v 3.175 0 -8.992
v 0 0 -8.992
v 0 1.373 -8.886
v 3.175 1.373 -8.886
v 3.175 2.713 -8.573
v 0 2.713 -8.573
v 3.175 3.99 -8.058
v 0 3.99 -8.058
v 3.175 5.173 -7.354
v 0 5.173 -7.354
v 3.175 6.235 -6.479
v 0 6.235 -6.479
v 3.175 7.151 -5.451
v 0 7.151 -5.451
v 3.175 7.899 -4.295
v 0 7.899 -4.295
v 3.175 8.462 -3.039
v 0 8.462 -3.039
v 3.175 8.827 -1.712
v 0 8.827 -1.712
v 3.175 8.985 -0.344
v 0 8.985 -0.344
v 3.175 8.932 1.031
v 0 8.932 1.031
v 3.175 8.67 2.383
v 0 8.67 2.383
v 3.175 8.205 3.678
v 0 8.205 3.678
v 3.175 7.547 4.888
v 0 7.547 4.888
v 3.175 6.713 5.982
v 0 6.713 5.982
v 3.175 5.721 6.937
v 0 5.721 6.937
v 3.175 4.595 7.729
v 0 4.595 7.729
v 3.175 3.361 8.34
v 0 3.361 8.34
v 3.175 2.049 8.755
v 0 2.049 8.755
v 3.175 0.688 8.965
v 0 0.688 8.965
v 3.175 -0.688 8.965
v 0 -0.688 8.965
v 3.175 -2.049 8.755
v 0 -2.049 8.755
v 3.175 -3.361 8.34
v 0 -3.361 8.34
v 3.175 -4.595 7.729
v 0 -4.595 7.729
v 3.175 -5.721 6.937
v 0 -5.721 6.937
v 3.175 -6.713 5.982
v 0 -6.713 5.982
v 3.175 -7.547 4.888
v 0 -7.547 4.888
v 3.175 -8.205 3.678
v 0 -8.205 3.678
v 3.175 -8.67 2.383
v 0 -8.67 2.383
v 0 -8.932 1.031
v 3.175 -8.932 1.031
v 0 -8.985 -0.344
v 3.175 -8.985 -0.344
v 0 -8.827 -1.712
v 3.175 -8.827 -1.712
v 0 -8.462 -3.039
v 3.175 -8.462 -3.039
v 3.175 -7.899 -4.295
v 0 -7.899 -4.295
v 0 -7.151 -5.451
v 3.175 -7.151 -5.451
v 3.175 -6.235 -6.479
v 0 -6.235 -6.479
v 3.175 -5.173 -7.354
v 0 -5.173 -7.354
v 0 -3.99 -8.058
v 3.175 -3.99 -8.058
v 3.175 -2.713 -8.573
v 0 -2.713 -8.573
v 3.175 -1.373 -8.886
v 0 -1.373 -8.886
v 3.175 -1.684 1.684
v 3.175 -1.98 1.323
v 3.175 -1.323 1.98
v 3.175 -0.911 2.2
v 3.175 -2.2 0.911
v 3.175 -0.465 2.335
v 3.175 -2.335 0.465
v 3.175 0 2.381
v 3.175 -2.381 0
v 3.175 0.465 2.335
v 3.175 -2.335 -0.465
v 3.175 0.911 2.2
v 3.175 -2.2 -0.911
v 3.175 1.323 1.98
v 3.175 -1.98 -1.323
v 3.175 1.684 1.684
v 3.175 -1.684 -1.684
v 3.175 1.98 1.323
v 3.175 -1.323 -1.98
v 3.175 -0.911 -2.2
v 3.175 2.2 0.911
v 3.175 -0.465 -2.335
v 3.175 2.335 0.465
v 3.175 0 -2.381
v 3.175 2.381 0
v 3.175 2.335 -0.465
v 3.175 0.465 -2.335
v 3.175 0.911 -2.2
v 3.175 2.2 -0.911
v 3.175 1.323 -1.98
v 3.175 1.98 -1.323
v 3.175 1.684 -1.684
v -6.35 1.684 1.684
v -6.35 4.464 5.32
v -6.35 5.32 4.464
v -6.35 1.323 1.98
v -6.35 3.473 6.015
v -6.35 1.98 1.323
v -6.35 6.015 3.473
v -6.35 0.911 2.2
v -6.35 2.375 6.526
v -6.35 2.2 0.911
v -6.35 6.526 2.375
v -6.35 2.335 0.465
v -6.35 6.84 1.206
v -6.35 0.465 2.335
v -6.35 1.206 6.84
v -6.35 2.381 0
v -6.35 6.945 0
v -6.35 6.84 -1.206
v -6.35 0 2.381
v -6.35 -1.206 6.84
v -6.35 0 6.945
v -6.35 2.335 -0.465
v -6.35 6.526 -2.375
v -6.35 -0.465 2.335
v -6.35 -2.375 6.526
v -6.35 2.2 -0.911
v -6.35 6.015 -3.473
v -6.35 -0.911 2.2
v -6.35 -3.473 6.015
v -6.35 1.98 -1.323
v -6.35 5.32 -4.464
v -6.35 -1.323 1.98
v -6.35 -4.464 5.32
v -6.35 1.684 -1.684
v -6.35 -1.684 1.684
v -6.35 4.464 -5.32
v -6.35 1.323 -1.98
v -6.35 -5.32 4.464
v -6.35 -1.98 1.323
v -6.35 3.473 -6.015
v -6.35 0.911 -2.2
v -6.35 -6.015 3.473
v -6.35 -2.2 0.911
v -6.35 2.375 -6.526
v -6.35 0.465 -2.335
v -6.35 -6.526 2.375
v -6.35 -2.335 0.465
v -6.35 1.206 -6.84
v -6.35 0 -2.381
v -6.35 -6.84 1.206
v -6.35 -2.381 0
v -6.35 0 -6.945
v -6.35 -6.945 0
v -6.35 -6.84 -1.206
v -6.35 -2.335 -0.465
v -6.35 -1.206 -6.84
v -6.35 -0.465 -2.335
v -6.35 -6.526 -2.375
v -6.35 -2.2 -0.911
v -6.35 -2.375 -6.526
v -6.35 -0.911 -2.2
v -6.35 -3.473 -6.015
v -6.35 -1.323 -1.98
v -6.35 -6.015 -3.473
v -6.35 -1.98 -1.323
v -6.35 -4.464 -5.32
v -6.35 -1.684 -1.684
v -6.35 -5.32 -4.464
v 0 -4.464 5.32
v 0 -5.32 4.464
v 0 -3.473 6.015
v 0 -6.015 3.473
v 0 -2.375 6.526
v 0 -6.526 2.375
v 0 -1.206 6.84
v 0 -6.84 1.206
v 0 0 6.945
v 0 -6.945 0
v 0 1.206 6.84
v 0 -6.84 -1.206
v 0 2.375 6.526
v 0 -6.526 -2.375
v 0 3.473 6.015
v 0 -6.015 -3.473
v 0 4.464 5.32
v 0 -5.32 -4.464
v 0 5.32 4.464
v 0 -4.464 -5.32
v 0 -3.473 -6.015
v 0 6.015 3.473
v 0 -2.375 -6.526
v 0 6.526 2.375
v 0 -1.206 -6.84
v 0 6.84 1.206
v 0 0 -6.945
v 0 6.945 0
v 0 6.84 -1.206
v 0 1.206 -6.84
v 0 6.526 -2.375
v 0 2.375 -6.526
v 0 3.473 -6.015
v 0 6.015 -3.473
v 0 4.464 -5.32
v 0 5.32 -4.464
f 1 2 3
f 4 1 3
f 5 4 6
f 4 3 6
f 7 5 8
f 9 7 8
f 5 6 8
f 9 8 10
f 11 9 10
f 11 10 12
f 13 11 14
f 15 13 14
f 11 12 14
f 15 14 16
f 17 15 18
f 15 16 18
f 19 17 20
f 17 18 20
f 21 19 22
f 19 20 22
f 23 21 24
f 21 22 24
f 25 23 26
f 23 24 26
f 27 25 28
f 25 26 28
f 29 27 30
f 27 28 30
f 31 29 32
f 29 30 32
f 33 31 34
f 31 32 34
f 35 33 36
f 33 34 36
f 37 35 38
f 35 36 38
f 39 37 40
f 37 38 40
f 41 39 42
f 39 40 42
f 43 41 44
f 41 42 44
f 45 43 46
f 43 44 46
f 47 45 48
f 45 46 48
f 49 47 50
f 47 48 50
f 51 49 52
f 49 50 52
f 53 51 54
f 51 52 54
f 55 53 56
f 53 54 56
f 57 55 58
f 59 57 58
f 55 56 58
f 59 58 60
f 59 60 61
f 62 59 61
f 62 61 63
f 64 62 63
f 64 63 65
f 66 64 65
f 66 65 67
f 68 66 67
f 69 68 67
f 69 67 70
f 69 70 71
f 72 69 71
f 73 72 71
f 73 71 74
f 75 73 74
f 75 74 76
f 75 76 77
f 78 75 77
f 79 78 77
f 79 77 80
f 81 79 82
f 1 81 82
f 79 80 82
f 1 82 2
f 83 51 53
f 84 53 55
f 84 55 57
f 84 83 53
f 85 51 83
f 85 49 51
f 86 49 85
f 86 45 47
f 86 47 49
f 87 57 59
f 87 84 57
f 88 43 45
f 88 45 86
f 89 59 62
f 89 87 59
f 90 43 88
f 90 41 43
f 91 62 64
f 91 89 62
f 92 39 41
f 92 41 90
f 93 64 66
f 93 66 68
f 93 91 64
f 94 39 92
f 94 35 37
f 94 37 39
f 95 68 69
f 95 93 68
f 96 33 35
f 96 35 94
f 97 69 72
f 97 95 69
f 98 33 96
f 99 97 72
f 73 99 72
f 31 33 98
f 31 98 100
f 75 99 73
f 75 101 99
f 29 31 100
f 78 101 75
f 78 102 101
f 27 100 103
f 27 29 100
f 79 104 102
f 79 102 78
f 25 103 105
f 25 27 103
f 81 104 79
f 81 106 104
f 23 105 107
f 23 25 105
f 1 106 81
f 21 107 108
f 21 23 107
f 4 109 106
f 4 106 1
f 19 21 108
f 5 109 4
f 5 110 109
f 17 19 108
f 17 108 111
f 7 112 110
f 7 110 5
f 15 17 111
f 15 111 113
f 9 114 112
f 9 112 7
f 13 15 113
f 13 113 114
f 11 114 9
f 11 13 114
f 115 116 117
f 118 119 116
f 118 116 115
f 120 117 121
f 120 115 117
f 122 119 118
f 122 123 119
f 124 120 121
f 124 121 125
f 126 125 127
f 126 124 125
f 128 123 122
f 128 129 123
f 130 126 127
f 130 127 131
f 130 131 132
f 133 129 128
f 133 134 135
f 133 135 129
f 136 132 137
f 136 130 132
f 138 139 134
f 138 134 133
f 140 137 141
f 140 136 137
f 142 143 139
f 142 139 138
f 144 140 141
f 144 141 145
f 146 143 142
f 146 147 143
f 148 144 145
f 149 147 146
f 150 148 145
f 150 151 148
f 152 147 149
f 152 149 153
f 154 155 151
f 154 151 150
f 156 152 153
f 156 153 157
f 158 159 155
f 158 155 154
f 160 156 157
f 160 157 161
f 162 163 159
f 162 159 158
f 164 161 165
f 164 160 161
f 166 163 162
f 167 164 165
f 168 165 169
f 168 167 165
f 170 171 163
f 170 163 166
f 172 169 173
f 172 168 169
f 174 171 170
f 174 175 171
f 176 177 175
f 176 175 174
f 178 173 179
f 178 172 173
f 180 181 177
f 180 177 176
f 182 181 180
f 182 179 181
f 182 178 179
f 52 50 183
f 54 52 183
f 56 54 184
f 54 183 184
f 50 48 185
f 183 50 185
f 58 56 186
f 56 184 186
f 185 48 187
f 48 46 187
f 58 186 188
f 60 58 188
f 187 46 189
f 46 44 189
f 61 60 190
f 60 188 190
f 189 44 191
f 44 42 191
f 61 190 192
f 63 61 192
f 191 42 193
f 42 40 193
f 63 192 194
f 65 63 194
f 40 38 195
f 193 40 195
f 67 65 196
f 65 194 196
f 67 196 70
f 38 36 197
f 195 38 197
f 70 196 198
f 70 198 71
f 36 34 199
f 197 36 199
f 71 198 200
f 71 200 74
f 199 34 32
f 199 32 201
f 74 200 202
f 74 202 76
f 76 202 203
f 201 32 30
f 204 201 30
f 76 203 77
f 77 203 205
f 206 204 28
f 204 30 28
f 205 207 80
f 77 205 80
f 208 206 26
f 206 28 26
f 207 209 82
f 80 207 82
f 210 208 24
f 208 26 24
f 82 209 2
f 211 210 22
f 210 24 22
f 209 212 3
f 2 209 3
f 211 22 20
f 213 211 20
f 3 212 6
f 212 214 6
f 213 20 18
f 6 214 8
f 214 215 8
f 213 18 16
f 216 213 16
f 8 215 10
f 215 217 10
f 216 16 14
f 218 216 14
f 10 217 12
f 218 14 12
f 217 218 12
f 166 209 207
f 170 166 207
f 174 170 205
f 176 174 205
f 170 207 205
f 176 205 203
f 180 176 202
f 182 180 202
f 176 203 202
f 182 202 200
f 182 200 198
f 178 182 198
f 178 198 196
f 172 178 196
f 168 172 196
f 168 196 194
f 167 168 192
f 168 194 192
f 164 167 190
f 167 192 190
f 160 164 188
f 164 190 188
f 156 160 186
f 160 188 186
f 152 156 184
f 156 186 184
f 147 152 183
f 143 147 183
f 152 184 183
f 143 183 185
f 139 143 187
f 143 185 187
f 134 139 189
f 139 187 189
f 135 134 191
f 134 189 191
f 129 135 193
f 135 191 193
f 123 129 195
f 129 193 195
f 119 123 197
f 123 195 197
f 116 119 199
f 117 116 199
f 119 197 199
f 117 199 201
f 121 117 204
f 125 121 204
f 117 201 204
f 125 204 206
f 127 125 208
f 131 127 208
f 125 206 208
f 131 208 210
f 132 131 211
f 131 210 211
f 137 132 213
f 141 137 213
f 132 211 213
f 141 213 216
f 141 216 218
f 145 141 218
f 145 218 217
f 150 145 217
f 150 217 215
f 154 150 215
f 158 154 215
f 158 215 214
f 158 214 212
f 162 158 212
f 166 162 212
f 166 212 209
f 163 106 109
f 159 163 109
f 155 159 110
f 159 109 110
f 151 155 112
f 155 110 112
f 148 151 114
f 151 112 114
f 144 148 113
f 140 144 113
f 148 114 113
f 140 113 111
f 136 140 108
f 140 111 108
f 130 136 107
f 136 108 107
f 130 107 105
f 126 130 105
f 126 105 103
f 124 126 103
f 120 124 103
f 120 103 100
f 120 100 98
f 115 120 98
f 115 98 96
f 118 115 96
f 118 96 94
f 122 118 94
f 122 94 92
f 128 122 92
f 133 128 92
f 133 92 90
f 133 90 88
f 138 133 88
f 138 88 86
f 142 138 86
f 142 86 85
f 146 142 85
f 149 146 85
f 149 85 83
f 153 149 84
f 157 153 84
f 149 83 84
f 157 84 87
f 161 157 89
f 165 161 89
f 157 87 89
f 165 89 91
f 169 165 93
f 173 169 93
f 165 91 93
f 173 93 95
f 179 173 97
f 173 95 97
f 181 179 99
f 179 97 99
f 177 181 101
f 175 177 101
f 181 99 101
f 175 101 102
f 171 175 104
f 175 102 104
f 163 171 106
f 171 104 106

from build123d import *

# Parameters (mm, degrees)
SKETCH1_R                   = 8.9916
BOSS_EXTRUDE1_DEPTH         = 3.175
SKETCH2_R                   = 6.9453125
BOSS_EXTRUDE2_DEPTH         = 6.35
F_21_0_159_DIAMETER_HOLE1_D = 4.7625


with BuildPart() as part:
    # Sketch1 → Boss-Extrude1 (new body)
    with BuildSketch(Plane(origin=(0, 0, 0), x_dir=(0, 0, -1), z_dir=(1, 0, 0))):
        Circle(SKETCH1_R)
    extrude(amount=BOSS_EXTRUDE1_DEPTH)

    # Sketch2 → Boss-Extrude2 (add)
    with BuildSketch(Plane.ZY):
        with Locations(Location((0, 0, 0), (0, 0, 180))):
            Circle(SKETCH2_R)
    extrude(amount=BOSS_EXTRUDE2_DEPTH)

    # #21 (0.159) Diameter Hole1 (through all)
    with Locations(Plane.ZY.offset(6.35)):
        with Locations((0, 0)):
            Hole(F_21_0_159_DIAMETER_HOLE1_D / 2)


solid = part.part
